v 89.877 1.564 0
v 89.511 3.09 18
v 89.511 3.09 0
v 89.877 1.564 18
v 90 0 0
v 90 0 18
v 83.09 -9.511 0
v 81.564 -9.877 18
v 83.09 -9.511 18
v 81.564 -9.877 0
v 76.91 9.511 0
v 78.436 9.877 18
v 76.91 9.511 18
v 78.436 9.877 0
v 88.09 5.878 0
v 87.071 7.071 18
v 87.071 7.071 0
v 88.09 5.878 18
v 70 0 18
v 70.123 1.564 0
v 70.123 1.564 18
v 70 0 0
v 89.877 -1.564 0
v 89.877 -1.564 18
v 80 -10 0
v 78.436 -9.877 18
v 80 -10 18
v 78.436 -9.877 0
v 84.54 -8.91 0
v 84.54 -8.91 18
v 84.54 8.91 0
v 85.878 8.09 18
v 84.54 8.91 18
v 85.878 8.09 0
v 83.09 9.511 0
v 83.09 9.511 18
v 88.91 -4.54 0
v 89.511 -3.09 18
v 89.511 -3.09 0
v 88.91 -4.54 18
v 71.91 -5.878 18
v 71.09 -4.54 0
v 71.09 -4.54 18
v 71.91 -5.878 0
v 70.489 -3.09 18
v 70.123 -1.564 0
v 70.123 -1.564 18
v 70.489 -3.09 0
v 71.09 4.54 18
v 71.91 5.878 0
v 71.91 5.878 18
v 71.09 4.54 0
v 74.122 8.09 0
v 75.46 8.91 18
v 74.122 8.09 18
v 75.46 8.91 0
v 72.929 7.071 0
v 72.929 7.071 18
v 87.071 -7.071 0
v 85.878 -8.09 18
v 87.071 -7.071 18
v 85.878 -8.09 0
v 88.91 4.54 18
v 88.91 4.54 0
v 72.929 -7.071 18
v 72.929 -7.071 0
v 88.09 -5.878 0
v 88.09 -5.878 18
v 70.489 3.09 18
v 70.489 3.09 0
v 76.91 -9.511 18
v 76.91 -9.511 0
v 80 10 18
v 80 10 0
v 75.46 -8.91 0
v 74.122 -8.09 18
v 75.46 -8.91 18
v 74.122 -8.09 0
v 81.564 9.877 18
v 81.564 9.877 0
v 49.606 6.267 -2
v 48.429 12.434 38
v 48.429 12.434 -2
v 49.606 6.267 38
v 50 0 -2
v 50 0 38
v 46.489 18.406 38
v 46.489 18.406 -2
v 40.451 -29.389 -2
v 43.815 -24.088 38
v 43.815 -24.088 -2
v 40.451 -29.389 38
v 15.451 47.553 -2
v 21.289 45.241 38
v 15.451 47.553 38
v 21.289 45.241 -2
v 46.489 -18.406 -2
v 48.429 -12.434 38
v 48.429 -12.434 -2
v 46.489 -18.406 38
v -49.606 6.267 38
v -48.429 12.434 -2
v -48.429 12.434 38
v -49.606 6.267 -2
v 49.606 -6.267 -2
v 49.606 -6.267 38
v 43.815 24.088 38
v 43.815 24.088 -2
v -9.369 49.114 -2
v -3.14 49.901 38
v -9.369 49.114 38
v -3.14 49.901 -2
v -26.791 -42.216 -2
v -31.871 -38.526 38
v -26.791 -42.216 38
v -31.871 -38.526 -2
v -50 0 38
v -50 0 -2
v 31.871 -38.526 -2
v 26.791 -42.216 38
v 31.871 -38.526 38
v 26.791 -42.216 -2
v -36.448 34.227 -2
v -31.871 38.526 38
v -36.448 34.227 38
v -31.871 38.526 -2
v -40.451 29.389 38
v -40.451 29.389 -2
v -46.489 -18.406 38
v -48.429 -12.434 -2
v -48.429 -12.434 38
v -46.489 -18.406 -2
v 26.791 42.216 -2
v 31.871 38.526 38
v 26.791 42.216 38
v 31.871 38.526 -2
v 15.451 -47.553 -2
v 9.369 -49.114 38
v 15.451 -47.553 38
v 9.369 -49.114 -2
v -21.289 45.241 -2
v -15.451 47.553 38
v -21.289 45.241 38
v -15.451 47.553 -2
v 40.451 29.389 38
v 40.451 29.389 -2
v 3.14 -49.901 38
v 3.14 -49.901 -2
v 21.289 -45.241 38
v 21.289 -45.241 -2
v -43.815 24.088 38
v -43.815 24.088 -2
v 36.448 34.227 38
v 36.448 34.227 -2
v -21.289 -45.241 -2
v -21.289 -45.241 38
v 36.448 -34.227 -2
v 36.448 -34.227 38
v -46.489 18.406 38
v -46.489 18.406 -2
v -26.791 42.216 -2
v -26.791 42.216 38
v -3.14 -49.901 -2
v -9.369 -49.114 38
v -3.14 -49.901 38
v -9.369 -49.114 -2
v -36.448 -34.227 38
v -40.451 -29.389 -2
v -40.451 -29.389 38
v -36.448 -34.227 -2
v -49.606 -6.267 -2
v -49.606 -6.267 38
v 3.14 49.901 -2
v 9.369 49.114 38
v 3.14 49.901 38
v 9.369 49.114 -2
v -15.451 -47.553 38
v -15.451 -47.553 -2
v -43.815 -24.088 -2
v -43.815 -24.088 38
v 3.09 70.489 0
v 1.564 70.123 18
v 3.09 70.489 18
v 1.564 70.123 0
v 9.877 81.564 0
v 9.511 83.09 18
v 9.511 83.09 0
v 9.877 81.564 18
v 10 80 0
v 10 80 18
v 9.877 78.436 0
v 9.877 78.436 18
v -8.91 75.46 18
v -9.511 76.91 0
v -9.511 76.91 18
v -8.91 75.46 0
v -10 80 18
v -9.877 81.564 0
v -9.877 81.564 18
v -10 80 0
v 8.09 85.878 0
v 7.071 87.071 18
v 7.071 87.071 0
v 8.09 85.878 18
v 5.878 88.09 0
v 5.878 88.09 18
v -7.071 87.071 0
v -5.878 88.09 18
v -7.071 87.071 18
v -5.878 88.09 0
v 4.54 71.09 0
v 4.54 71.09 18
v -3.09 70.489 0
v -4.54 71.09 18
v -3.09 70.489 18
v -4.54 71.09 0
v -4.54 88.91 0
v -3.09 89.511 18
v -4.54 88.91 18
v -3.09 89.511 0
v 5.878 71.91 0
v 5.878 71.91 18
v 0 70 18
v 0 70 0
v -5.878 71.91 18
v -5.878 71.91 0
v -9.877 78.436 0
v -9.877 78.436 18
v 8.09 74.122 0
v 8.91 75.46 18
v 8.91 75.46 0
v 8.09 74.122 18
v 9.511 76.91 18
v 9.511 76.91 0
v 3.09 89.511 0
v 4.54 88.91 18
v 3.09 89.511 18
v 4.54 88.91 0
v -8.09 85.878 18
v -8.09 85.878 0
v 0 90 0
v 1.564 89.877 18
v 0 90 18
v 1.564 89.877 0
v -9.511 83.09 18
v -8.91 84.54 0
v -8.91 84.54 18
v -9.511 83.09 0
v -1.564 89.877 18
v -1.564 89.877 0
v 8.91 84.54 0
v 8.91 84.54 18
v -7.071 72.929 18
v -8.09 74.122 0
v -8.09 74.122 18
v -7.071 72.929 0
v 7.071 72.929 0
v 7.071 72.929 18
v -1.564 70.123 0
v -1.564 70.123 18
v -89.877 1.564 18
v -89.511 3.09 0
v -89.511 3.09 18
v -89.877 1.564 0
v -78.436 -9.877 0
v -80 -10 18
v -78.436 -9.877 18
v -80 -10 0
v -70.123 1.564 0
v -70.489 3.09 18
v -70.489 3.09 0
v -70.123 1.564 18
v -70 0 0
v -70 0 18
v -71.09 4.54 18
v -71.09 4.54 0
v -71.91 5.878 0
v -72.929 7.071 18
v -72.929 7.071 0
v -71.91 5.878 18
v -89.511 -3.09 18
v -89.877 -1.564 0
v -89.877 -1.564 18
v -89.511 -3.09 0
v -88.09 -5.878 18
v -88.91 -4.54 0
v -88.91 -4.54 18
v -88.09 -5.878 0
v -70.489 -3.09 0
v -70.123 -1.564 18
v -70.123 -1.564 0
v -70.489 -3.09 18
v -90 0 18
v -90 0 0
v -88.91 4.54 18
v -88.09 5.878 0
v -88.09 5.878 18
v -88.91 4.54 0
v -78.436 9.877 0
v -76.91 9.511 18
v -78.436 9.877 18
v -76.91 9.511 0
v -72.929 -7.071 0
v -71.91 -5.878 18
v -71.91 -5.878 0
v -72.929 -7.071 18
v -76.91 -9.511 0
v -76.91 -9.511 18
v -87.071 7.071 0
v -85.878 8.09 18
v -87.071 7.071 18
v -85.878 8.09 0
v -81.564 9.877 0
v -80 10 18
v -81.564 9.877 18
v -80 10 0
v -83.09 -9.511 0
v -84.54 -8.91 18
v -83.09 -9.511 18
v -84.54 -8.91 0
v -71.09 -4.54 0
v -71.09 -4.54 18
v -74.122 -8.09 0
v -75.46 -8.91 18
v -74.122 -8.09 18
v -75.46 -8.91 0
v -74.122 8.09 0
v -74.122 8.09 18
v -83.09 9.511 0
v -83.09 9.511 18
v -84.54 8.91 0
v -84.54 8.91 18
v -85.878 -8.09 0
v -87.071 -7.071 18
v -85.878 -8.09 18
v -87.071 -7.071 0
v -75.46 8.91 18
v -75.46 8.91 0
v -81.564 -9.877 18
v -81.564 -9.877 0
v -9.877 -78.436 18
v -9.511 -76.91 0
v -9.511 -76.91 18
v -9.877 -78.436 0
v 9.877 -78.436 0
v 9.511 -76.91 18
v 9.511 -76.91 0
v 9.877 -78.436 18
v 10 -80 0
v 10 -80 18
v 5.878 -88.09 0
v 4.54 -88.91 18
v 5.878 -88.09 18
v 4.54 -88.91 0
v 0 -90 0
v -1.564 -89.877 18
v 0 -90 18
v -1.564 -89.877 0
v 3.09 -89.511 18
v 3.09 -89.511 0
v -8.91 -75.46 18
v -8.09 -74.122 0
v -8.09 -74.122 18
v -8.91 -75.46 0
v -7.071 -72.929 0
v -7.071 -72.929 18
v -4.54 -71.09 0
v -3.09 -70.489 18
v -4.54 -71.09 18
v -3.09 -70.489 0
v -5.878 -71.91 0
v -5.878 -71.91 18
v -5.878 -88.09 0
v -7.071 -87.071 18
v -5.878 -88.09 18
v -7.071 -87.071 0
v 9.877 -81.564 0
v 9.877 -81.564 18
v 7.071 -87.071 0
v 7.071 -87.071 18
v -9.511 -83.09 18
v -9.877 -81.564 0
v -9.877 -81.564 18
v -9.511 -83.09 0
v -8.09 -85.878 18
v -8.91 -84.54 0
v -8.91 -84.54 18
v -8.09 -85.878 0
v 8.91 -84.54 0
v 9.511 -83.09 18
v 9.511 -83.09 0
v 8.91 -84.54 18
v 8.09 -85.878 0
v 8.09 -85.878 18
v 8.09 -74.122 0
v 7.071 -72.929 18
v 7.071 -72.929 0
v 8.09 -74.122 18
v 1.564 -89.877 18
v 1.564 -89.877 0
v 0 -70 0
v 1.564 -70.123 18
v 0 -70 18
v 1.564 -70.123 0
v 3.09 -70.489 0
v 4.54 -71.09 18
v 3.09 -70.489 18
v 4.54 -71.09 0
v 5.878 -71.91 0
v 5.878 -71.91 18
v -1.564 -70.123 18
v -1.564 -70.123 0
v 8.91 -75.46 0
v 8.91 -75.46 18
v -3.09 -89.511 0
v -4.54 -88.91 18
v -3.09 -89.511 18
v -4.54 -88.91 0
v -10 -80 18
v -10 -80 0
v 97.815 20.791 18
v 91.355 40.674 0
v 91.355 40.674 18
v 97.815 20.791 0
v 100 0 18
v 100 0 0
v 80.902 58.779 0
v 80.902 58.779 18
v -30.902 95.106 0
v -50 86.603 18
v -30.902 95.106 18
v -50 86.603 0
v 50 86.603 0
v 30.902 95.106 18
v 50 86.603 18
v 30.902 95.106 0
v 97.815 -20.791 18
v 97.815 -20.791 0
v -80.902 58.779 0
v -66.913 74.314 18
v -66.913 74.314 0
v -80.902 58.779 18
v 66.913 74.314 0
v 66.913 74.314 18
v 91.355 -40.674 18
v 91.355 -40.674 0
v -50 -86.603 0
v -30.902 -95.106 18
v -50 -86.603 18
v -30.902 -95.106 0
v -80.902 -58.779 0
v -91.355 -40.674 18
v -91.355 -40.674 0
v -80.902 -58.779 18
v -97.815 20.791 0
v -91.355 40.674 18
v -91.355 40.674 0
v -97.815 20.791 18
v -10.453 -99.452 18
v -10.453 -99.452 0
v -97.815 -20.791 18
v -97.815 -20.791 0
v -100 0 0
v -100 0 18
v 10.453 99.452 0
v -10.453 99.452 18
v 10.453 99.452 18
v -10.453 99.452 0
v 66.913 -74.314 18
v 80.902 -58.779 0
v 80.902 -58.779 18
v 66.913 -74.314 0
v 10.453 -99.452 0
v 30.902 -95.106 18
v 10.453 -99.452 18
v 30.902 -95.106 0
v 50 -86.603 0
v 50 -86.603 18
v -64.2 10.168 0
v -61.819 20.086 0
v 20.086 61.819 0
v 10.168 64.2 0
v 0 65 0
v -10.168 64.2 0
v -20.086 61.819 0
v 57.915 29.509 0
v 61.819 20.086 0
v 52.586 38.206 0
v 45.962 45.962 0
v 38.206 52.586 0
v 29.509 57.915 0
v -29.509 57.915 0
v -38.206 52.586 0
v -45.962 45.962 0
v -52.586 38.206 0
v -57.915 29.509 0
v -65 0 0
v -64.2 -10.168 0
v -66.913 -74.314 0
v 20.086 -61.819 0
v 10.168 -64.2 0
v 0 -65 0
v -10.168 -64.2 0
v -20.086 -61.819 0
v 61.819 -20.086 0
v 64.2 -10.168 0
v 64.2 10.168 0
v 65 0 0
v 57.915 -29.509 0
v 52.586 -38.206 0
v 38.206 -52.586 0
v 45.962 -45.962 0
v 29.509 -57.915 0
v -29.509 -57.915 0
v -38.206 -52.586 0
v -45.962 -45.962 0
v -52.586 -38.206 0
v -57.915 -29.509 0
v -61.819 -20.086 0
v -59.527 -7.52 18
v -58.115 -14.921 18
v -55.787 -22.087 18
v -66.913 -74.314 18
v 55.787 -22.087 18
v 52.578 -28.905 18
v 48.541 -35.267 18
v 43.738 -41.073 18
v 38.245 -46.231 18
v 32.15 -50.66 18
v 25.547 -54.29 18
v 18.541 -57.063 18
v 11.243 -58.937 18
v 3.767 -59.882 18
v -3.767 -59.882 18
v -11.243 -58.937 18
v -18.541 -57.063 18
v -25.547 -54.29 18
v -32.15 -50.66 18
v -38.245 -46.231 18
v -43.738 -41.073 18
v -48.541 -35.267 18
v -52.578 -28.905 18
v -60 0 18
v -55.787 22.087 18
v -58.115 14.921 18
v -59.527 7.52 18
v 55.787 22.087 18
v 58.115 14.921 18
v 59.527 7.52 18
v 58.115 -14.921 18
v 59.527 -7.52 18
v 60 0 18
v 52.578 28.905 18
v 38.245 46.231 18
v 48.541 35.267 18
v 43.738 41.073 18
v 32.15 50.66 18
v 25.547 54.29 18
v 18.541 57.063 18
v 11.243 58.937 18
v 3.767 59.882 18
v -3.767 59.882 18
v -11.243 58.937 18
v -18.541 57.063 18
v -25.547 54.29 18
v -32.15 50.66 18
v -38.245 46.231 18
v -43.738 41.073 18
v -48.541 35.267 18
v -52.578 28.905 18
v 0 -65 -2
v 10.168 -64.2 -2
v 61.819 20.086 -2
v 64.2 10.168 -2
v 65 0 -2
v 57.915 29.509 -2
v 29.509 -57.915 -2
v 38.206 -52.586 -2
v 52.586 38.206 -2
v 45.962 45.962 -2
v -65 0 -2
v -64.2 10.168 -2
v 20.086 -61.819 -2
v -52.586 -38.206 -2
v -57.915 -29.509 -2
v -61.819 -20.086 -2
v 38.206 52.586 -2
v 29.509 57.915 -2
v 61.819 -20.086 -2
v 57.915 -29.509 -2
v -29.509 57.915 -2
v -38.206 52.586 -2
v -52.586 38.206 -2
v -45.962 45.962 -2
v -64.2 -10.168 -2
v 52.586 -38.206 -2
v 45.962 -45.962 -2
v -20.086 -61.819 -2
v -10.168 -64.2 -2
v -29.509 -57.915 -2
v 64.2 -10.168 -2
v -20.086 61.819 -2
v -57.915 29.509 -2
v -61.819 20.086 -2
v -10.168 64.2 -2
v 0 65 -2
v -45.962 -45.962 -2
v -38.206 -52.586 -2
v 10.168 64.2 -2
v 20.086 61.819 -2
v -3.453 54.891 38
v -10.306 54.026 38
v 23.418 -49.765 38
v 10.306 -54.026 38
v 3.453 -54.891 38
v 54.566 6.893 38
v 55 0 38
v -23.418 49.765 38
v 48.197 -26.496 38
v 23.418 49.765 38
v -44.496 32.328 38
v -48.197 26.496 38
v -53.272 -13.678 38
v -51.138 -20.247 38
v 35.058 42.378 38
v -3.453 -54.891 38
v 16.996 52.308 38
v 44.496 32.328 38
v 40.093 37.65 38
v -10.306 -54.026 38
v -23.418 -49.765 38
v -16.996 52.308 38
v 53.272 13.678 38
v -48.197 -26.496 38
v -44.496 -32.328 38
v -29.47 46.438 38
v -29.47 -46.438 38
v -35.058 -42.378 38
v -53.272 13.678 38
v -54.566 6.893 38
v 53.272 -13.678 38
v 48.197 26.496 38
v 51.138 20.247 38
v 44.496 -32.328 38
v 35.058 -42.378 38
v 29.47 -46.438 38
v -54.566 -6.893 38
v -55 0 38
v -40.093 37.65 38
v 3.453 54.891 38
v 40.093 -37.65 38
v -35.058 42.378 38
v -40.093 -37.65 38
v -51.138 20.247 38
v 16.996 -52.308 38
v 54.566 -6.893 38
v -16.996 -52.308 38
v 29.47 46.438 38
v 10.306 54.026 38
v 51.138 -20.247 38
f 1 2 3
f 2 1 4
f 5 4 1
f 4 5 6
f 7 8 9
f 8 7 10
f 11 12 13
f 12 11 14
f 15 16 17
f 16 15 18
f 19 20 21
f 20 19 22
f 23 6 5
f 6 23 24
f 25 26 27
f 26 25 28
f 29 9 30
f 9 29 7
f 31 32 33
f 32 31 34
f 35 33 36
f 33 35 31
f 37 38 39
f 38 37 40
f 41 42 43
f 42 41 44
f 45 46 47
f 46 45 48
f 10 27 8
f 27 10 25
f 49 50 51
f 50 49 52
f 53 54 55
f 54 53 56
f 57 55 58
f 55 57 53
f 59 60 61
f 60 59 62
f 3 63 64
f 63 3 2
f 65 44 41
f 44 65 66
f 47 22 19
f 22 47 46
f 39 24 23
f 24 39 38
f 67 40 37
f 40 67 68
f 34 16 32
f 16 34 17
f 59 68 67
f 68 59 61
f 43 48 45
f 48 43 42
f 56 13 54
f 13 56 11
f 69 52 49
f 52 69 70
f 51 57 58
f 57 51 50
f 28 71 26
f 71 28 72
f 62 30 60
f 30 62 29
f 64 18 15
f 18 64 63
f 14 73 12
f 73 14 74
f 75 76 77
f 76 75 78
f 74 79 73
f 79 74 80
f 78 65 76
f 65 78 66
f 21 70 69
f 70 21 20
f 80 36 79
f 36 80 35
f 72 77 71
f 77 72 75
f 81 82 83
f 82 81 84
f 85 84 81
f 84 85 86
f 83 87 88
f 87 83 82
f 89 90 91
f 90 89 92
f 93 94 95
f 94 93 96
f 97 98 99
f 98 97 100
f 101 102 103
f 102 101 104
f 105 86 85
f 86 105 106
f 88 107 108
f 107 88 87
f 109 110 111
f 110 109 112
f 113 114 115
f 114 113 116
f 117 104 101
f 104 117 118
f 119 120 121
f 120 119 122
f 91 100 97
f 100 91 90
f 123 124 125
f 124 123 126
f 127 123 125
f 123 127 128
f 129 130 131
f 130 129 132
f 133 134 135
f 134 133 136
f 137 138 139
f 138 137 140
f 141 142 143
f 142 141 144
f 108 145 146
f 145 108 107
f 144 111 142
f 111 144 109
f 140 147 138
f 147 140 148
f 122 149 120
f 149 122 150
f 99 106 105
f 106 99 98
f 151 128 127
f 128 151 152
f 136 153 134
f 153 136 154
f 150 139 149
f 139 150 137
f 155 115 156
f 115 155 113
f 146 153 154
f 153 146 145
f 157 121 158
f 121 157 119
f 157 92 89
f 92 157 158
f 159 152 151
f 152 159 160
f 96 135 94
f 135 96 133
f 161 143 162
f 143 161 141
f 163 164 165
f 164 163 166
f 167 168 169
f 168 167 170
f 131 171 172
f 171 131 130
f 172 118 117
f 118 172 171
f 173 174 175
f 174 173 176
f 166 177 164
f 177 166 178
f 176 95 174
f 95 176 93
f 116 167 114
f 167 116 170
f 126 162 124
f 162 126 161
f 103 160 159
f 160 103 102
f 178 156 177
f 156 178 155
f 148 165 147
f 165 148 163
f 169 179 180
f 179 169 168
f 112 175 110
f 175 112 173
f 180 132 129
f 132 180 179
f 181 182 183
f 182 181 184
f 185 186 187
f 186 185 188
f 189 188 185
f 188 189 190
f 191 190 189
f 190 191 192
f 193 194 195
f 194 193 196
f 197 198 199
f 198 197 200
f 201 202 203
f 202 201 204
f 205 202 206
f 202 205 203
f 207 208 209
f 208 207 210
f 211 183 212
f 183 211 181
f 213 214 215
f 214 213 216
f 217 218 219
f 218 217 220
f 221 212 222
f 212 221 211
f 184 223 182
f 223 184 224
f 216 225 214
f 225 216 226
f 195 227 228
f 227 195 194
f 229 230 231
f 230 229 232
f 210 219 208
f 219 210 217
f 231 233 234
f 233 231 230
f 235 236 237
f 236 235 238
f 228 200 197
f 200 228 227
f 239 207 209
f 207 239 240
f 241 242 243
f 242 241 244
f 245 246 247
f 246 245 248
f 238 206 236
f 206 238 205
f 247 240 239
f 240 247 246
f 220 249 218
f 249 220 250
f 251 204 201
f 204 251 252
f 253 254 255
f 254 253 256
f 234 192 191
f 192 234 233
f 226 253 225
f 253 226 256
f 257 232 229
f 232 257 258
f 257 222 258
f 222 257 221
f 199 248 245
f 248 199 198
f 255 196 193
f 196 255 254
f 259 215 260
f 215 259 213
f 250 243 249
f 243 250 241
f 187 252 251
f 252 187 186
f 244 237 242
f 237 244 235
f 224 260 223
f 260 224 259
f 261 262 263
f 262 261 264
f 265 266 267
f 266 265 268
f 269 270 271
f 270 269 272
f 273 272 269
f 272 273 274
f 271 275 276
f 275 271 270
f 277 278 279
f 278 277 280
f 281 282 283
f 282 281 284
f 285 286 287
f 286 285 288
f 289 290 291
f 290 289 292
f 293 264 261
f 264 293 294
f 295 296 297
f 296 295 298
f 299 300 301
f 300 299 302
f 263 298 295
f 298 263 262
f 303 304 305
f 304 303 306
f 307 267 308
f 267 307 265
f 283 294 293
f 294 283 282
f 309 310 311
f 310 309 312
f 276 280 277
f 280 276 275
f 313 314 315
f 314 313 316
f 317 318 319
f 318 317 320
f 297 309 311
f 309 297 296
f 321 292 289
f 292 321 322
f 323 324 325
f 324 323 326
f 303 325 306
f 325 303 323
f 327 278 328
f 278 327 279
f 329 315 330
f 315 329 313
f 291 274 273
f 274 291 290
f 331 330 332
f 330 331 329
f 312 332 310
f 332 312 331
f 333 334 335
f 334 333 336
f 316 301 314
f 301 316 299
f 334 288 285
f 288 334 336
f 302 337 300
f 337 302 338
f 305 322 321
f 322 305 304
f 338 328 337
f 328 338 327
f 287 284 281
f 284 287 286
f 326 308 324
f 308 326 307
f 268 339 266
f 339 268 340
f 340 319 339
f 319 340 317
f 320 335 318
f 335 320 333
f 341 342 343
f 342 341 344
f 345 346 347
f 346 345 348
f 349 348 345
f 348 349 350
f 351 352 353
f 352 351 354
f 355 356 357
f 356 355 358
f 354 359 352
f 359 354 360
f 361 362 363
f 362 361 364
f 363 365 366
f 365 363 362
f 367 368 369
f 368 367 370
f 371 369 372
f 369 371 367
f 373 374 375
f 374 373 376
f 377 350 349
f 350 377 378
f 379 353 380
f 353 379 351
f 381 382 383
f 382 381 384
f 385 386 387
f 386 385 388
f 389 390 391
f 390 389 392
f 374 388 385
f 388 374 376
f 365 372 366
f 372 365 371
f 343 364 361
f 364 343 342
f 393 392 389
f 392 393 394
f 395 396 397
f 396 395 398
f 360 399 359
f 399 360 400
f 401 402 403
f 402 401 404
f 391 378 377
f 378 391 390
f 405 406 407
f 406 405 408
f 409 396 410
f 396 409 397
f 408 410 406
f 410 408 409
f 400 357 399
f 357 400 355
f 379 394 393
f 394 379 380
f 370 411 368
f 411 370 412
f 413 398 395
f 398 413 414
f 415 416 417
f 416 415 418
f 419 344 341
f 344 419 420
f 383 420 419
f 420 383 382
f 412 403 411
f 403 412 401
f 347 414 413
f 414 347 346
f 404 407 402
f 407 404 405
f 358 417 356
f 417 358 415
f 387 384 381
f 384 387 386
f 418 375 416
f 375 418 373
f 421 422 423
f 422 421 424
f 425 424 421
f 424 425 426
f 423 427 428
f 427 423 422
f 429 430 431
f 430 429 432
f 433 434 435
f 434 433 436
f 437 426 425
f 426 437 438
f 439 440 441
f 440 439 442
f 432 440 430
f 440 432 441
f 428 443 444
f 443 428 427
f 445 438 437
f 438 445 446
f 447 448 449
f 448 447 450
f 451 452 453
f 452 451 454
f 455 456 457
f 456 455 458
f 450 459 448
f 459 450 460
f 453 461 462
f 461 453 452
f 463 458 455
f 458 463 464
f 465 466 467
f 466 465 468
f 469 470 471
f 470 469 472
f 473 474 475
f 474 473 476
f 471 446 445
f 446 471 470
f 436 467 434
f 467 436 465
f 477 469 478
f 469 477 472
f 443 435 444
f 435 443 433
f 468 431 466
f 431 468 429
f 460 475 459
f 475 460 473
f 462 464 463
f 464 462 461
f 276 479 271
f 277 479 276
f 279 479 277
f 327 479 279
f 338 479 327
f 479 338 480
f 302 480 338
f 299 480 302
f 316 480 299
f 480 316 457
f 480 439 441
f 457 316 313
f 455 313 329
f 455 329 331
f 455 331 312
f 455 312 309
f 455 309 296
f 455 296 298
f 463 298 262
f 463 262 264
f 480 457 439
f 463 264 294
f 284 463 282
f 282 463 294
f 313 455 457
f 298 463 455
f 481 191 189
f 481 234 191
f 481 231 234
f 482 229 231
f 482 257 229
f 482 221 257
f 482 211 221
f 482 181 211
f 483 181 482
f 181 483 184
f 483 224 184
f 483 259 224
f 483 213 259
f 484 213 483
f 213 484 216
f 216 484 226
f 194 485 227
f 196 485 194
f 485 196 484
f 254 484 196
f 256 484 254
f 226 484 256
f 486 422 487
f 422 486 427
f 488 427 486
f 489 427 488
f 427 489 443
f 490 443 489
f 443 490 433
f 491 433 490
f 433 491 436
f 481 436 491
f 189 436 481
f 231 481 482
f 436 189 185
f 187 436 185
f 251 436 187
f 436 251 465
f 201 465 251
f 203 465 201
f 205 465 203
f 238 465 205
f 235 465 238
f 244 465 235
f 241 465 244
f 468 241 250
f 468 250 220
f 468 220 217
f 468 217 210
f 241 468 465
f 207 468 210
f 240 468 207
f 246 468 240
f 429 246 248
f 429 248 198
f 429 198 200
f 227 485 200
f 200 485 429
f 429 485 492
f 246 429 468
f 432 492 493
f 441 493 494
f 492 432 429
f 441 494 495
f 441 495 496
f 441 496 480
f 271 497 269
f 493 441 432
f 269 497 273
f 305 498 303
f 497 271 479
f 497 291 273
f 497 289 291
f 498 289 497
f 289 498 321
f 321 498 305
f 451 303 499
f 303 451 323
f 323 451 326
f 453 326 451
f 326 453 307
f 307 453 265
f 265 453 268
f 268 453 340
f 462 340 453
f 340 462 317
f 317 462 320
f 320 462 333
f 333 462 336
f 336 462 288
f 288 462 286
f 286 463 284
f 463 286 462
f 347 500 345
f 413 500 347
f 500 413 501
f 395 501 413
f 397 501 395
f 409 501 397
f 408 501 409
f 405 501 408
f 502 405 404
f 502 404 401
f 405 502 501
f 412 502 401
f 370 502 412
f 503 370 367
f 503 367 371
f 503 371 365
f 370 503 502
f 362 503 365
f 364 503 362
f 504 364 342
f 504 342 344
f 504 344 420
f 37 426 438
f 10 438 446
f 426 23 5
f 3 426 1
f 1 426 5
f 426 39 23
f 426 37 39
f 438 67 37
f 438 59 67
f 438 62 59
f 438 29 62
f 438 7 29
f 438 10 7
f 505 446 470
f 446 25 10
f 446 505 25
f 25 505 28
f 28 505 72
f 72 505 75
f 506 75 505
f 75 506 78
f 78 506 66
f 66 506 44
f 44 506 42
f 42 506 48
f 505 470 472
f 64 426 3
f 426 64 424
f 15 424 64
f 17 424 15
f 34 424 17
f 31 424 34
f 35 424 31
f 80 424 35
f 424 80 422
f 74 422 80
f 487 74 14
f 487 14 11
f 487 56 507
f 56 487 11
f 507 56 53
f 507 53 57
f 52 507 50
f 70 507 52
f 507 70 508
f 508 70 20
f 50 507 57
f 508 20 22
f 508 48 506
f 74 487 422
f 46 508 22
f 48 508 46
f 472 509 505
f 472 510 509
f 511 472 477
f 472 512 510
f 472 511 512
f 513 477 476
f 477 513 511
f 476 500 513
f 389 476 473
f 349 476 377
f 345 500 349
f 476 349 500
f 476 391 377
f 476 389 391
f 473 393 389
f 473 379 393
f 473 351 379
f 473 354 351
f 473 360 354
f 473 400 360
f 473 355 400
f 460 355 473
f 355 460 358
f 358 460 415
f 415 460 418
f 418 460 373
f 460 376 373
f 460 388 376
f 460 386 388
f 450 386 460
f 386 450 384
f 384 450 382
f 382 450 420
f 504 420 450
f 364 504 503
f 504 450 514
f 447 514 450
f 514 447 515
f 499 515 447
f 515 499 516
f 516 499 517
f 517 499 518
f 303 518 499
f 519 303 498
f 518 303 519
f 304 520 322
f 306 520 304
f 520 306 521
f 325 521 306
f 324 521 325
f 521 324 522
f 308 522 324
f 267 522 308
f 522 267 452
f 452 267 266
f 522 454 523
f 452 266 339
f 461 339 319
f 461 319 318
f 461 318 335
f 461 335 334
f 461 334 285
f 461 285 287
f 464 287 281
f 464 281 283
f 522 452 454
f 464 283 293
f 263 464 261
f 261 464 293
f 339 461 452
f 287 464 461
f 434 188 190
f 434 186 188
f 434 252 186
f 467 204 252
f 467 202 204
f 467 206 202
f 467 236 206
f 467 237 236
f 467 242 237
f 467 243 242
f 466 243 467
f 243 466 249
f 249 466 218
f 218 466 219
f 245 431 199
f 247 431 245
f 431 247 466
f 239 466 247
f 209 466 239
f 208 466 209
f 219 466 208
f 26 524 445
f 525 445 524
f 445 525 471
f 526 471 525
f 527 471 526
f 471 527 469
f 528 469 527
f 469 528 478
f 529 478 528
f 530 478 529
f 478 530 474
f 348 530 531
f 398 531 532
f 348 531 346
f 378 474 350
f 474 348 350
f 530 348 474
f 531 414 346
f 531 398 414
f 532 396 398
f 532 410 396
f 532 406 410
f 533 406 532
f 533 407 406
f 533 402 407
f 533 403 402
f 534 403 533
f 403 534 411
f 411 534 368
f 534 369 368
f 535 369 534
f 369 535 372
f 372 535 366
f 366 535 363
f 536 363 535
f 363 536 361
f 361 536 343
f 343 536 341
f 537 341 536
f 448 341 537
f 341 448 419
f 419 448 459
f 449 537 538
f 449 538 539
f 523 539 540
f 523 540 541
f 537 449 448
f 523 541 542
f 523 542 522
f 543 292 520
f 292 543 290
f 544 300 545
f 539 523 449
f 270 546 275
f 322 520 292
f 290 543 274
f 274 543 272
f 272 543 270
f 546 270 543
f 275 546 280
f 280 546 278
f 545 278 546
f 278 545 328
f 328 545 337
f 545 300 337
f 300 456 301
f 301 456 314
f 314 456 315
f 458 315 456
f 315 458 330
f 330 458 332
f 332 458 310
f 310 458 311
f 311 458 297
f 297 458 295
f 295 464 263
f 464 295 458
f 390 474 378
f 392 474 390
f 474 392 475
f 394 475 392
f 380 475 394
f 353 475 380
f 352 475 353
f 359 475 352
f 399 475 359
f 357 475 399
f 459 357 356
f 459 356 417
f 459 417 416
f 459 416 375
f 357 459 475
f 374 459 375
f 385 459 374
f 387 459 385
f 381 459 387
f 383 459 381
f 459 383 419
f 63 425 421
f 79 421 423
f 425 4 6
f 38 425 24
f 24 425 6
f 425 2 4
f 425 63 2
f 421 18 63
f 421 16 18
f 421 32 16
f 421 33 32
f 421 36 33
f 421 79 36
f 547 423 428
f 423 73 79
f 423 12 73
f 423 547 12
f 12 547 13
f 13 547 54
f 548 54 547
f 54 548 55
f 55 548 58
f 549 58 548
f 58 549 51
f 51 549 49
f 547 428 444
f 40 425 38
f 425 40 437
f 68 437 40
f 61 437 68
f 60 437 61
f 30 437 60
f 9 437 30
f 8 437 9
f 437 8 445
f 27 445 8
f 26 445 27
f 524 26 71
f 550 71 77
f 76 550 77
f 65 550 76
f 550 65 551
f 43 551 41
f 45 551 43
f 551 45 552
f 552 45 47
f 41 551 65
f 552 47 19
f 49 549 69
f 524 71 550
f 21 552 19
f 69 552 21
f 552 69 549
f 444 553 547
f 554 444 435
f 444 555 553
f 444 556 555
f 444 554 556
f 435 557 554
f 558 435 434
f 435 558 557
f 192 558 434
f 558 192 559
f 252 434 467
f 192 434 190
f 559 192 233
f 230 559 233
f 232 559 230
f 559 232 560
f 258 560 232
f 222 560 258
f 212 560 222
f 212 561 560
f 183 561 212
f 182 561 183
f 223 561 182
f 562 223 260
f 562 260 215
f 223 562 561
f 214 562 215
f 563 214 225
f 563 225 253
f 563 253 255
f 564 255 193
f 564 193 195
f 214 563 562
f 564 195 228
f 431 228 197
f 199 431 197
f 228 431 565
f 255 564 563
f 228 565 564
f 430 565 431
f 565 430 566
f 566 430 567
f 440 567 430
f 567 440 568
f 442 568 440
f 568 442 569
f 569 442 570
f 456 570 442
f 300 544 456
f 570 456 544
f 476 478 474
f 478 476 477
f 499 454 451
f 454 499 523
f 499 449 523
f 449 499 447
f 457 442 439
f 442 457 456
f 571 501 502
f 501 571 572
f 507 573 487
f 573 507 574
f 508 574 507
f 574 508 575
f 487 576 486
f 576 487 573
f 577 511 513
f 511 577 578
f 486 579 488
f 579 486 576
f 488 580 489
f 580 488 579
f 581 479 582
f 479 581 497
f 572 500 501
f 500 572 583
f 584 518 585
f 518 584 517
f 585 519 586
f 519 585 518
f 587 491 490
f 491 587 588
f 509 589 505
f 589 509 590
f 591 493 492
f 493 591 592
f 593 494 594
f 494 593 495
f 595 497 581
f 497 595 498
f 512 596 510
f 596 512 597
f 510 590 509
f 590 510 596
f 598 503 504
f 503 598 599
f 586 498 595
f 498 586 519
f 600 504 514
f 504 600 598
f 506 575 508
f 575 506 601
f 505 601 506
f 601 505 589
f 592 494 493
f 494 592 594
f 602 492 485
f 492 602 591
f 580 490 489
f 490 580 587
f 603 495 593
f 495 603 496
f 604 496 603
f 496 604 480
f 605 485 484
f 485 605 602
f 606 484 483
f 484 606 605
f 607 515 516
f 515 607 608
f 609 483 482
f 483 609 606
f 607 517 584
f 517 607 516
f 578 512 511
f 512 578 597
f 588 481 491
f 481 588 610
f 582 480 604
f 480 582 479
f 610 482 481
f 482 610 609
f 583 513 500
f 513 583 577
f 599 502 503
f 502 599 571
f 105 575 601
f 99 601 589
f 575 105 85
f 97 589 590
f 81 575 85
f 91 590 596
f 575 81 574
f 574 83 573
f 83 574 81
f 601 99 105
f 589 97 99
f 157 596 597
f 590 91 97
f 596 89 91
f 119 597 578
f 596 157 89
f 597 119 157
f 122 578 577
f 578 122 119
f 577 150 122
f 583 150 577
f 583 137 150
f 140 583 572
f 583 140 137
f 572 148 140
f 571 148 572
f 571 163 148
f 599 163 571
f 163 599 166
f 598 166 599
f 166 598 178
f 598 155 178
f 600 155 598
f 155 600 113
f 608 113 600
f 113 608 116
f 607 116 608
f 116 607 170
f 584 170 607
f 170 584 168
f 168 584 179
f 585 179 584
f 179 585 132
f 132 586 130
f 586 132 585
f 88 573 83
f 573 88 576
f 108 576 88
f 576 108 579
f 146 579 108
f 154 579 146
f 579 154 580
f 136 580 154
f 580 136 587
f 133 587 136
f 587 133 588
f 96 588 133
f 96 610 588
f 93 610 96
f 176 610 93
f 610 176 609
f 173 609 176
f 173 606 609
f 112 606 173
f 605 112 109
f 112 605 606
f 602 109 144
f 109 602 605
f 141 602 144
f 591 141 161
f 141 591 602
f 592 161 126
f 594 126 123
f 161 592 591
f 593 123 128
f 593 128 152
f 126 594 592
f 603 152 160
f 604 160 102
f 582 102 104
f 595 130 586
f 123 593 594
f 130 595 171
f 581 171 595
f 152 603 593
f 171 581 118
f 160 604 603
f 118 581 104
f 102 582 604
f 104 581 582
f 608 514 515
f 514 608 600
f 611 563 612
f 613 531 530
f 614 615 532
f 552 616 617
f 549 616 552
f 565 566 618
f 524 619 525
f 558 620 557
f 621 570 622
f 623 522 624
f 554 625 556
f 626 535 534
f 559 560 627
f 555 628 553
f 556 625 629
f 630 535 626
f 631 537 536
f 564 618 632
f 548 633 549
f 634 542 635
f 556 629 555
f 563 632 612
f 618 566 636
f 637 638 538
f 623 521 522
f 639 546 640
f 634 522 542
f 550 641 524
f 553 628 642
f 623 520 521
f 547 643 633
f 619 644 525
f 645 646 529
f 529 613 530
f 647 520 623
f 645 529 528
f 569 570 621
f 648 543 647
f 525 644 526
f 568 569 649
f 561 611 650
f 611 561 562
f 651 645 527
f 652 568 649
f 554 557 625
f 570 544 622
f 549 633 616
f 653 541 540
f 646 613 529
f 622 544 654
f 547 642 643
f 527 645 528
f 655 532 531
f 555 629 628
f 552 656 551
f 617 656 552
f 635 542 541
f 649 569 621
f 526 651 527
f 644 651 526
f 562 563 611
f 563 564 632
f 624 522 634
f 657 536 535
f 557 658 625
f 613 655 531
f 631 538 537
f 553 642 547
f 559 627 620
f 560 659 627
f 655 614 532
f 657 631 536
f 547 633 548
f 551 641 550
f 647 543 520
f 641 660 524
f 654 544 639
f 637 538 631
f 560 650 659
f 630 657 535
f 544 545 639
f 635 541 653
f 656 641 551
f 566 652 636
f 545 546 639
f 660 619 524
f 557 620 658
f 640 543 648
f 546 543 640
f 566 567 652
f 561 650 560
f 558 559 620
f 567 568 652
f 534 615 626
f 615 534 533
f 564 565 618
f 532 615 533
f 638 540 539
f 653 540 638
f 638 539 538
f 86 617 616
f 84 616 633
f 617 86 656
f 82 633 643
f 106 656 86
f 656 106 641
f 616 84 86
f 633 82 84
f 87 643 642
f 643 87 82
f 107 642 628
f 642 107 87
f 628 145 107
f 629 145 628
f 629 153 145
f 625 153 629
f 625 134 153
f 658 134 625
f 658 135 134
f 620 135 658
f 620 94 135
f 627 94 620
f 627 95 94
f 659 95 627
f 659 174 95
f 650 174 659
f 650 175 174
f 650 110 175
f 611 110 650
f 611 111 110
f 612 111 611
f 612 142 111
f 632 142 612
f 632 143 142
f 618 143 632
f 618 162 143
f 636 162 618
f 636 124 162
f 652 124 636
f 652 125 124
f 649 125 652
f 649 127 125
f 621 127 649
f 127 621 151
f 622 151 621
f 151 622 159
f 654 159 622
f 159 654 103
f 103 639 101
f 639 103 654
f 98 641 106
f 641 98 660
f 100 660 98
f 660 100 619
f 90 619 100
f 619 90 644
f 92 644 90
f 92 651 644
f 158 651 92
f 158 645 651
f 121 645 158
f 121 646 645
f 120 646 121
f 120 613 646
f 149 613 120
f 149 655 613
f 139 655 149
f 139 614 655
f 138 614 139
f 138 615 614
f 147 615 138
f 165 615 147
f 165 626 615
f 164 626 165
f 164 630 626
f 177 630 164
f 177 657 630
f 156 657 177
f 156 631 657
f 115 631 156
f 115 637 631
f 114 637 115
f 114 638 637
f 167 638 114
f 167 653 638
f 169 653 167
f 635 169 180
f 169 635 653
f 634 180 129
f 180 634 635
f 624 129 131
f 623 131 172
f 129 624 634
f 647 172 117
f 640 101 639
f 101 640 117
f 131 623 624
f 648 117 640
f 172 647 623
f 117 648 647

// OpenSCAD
module Flange_03(){

    Flange_Height = 18;
    Total_Height = 38;
    Step_Height = 2;
    Hole_Diameter = 10; 
    Hole_Center_Distance = 100;

    color("#c0c6c7"){
        difference(){
      
            union(){
                translate([0,0,- Step_Height]){ 
                cylinder(Step_Height,65,65,$fn=40);
                }

                difference(){
                    cylinder(Flange_Height,100,100,$fn=30);
                    
                    r = 80;
                    // Flange Holes
                    for (i=[0:90:359]) {
                        translate([r*cos(i),r*sin(i),-1])
                        cylinder(Flange_Height+2,10,10,$fn=40);
                     
                        translate([0,0,-1]) 
                        cylinder(12,50,50,$fn=50);  
                     }
                 }         
           translate([0,0,Flange_Height]) 
            cylinder(Total_Height - Flange_Height,60,55,$fn=50);    
            }    
            translate([0,0,-10]) 
            cylinder(100,50,50,$fn=50);
        }
    }
}

Flange_03();

// Written by Nicolì Angelo (Gengio) 2024: 
// MIT License

//Permission is hereby granted, free of charge, to any person obtaining a copy of this software and associated documentation files (the "Software"), to deal in the Software without restriction, including without limitation the rights to use, copy, modify, merge, publish, distribute, sublicense, and/or sell copies of the Software, and to permit persons to whom the Software is furnished to do so, subject to the following conditions:

//The above copyright notice and this permission notice shall be included in all copies or substantial portions of the Software.

//THE SOFTWARE IS PROVIDED "AS IS", WITHOUT WARRANTY OF ANY KIND, EXPRESS OR IMPLIED, INCLUDING BUT NOT LIMITED TO THE WARRANTIES OF MERCHANTABILITY, FITNESS FOR A PARTICULAR PURPOSE AND NONINFRINGEMENT. IN NO EVENT SHALL THE AUTHORS OR COPYRIGHT HOLDERS BE LIABLE FOR ANY CLAIM, DAMAGES OR OTHER LIABILITY, WHETHER IN AN ACTION OF CONTRACT, TORT OR OTHERWISE, ARISING FROM, OUT OF OR IN CONNECTION WITH THE SOFTWARE OR THE USE OR OTHER DEALINGS IN THE SOFTWARE.
